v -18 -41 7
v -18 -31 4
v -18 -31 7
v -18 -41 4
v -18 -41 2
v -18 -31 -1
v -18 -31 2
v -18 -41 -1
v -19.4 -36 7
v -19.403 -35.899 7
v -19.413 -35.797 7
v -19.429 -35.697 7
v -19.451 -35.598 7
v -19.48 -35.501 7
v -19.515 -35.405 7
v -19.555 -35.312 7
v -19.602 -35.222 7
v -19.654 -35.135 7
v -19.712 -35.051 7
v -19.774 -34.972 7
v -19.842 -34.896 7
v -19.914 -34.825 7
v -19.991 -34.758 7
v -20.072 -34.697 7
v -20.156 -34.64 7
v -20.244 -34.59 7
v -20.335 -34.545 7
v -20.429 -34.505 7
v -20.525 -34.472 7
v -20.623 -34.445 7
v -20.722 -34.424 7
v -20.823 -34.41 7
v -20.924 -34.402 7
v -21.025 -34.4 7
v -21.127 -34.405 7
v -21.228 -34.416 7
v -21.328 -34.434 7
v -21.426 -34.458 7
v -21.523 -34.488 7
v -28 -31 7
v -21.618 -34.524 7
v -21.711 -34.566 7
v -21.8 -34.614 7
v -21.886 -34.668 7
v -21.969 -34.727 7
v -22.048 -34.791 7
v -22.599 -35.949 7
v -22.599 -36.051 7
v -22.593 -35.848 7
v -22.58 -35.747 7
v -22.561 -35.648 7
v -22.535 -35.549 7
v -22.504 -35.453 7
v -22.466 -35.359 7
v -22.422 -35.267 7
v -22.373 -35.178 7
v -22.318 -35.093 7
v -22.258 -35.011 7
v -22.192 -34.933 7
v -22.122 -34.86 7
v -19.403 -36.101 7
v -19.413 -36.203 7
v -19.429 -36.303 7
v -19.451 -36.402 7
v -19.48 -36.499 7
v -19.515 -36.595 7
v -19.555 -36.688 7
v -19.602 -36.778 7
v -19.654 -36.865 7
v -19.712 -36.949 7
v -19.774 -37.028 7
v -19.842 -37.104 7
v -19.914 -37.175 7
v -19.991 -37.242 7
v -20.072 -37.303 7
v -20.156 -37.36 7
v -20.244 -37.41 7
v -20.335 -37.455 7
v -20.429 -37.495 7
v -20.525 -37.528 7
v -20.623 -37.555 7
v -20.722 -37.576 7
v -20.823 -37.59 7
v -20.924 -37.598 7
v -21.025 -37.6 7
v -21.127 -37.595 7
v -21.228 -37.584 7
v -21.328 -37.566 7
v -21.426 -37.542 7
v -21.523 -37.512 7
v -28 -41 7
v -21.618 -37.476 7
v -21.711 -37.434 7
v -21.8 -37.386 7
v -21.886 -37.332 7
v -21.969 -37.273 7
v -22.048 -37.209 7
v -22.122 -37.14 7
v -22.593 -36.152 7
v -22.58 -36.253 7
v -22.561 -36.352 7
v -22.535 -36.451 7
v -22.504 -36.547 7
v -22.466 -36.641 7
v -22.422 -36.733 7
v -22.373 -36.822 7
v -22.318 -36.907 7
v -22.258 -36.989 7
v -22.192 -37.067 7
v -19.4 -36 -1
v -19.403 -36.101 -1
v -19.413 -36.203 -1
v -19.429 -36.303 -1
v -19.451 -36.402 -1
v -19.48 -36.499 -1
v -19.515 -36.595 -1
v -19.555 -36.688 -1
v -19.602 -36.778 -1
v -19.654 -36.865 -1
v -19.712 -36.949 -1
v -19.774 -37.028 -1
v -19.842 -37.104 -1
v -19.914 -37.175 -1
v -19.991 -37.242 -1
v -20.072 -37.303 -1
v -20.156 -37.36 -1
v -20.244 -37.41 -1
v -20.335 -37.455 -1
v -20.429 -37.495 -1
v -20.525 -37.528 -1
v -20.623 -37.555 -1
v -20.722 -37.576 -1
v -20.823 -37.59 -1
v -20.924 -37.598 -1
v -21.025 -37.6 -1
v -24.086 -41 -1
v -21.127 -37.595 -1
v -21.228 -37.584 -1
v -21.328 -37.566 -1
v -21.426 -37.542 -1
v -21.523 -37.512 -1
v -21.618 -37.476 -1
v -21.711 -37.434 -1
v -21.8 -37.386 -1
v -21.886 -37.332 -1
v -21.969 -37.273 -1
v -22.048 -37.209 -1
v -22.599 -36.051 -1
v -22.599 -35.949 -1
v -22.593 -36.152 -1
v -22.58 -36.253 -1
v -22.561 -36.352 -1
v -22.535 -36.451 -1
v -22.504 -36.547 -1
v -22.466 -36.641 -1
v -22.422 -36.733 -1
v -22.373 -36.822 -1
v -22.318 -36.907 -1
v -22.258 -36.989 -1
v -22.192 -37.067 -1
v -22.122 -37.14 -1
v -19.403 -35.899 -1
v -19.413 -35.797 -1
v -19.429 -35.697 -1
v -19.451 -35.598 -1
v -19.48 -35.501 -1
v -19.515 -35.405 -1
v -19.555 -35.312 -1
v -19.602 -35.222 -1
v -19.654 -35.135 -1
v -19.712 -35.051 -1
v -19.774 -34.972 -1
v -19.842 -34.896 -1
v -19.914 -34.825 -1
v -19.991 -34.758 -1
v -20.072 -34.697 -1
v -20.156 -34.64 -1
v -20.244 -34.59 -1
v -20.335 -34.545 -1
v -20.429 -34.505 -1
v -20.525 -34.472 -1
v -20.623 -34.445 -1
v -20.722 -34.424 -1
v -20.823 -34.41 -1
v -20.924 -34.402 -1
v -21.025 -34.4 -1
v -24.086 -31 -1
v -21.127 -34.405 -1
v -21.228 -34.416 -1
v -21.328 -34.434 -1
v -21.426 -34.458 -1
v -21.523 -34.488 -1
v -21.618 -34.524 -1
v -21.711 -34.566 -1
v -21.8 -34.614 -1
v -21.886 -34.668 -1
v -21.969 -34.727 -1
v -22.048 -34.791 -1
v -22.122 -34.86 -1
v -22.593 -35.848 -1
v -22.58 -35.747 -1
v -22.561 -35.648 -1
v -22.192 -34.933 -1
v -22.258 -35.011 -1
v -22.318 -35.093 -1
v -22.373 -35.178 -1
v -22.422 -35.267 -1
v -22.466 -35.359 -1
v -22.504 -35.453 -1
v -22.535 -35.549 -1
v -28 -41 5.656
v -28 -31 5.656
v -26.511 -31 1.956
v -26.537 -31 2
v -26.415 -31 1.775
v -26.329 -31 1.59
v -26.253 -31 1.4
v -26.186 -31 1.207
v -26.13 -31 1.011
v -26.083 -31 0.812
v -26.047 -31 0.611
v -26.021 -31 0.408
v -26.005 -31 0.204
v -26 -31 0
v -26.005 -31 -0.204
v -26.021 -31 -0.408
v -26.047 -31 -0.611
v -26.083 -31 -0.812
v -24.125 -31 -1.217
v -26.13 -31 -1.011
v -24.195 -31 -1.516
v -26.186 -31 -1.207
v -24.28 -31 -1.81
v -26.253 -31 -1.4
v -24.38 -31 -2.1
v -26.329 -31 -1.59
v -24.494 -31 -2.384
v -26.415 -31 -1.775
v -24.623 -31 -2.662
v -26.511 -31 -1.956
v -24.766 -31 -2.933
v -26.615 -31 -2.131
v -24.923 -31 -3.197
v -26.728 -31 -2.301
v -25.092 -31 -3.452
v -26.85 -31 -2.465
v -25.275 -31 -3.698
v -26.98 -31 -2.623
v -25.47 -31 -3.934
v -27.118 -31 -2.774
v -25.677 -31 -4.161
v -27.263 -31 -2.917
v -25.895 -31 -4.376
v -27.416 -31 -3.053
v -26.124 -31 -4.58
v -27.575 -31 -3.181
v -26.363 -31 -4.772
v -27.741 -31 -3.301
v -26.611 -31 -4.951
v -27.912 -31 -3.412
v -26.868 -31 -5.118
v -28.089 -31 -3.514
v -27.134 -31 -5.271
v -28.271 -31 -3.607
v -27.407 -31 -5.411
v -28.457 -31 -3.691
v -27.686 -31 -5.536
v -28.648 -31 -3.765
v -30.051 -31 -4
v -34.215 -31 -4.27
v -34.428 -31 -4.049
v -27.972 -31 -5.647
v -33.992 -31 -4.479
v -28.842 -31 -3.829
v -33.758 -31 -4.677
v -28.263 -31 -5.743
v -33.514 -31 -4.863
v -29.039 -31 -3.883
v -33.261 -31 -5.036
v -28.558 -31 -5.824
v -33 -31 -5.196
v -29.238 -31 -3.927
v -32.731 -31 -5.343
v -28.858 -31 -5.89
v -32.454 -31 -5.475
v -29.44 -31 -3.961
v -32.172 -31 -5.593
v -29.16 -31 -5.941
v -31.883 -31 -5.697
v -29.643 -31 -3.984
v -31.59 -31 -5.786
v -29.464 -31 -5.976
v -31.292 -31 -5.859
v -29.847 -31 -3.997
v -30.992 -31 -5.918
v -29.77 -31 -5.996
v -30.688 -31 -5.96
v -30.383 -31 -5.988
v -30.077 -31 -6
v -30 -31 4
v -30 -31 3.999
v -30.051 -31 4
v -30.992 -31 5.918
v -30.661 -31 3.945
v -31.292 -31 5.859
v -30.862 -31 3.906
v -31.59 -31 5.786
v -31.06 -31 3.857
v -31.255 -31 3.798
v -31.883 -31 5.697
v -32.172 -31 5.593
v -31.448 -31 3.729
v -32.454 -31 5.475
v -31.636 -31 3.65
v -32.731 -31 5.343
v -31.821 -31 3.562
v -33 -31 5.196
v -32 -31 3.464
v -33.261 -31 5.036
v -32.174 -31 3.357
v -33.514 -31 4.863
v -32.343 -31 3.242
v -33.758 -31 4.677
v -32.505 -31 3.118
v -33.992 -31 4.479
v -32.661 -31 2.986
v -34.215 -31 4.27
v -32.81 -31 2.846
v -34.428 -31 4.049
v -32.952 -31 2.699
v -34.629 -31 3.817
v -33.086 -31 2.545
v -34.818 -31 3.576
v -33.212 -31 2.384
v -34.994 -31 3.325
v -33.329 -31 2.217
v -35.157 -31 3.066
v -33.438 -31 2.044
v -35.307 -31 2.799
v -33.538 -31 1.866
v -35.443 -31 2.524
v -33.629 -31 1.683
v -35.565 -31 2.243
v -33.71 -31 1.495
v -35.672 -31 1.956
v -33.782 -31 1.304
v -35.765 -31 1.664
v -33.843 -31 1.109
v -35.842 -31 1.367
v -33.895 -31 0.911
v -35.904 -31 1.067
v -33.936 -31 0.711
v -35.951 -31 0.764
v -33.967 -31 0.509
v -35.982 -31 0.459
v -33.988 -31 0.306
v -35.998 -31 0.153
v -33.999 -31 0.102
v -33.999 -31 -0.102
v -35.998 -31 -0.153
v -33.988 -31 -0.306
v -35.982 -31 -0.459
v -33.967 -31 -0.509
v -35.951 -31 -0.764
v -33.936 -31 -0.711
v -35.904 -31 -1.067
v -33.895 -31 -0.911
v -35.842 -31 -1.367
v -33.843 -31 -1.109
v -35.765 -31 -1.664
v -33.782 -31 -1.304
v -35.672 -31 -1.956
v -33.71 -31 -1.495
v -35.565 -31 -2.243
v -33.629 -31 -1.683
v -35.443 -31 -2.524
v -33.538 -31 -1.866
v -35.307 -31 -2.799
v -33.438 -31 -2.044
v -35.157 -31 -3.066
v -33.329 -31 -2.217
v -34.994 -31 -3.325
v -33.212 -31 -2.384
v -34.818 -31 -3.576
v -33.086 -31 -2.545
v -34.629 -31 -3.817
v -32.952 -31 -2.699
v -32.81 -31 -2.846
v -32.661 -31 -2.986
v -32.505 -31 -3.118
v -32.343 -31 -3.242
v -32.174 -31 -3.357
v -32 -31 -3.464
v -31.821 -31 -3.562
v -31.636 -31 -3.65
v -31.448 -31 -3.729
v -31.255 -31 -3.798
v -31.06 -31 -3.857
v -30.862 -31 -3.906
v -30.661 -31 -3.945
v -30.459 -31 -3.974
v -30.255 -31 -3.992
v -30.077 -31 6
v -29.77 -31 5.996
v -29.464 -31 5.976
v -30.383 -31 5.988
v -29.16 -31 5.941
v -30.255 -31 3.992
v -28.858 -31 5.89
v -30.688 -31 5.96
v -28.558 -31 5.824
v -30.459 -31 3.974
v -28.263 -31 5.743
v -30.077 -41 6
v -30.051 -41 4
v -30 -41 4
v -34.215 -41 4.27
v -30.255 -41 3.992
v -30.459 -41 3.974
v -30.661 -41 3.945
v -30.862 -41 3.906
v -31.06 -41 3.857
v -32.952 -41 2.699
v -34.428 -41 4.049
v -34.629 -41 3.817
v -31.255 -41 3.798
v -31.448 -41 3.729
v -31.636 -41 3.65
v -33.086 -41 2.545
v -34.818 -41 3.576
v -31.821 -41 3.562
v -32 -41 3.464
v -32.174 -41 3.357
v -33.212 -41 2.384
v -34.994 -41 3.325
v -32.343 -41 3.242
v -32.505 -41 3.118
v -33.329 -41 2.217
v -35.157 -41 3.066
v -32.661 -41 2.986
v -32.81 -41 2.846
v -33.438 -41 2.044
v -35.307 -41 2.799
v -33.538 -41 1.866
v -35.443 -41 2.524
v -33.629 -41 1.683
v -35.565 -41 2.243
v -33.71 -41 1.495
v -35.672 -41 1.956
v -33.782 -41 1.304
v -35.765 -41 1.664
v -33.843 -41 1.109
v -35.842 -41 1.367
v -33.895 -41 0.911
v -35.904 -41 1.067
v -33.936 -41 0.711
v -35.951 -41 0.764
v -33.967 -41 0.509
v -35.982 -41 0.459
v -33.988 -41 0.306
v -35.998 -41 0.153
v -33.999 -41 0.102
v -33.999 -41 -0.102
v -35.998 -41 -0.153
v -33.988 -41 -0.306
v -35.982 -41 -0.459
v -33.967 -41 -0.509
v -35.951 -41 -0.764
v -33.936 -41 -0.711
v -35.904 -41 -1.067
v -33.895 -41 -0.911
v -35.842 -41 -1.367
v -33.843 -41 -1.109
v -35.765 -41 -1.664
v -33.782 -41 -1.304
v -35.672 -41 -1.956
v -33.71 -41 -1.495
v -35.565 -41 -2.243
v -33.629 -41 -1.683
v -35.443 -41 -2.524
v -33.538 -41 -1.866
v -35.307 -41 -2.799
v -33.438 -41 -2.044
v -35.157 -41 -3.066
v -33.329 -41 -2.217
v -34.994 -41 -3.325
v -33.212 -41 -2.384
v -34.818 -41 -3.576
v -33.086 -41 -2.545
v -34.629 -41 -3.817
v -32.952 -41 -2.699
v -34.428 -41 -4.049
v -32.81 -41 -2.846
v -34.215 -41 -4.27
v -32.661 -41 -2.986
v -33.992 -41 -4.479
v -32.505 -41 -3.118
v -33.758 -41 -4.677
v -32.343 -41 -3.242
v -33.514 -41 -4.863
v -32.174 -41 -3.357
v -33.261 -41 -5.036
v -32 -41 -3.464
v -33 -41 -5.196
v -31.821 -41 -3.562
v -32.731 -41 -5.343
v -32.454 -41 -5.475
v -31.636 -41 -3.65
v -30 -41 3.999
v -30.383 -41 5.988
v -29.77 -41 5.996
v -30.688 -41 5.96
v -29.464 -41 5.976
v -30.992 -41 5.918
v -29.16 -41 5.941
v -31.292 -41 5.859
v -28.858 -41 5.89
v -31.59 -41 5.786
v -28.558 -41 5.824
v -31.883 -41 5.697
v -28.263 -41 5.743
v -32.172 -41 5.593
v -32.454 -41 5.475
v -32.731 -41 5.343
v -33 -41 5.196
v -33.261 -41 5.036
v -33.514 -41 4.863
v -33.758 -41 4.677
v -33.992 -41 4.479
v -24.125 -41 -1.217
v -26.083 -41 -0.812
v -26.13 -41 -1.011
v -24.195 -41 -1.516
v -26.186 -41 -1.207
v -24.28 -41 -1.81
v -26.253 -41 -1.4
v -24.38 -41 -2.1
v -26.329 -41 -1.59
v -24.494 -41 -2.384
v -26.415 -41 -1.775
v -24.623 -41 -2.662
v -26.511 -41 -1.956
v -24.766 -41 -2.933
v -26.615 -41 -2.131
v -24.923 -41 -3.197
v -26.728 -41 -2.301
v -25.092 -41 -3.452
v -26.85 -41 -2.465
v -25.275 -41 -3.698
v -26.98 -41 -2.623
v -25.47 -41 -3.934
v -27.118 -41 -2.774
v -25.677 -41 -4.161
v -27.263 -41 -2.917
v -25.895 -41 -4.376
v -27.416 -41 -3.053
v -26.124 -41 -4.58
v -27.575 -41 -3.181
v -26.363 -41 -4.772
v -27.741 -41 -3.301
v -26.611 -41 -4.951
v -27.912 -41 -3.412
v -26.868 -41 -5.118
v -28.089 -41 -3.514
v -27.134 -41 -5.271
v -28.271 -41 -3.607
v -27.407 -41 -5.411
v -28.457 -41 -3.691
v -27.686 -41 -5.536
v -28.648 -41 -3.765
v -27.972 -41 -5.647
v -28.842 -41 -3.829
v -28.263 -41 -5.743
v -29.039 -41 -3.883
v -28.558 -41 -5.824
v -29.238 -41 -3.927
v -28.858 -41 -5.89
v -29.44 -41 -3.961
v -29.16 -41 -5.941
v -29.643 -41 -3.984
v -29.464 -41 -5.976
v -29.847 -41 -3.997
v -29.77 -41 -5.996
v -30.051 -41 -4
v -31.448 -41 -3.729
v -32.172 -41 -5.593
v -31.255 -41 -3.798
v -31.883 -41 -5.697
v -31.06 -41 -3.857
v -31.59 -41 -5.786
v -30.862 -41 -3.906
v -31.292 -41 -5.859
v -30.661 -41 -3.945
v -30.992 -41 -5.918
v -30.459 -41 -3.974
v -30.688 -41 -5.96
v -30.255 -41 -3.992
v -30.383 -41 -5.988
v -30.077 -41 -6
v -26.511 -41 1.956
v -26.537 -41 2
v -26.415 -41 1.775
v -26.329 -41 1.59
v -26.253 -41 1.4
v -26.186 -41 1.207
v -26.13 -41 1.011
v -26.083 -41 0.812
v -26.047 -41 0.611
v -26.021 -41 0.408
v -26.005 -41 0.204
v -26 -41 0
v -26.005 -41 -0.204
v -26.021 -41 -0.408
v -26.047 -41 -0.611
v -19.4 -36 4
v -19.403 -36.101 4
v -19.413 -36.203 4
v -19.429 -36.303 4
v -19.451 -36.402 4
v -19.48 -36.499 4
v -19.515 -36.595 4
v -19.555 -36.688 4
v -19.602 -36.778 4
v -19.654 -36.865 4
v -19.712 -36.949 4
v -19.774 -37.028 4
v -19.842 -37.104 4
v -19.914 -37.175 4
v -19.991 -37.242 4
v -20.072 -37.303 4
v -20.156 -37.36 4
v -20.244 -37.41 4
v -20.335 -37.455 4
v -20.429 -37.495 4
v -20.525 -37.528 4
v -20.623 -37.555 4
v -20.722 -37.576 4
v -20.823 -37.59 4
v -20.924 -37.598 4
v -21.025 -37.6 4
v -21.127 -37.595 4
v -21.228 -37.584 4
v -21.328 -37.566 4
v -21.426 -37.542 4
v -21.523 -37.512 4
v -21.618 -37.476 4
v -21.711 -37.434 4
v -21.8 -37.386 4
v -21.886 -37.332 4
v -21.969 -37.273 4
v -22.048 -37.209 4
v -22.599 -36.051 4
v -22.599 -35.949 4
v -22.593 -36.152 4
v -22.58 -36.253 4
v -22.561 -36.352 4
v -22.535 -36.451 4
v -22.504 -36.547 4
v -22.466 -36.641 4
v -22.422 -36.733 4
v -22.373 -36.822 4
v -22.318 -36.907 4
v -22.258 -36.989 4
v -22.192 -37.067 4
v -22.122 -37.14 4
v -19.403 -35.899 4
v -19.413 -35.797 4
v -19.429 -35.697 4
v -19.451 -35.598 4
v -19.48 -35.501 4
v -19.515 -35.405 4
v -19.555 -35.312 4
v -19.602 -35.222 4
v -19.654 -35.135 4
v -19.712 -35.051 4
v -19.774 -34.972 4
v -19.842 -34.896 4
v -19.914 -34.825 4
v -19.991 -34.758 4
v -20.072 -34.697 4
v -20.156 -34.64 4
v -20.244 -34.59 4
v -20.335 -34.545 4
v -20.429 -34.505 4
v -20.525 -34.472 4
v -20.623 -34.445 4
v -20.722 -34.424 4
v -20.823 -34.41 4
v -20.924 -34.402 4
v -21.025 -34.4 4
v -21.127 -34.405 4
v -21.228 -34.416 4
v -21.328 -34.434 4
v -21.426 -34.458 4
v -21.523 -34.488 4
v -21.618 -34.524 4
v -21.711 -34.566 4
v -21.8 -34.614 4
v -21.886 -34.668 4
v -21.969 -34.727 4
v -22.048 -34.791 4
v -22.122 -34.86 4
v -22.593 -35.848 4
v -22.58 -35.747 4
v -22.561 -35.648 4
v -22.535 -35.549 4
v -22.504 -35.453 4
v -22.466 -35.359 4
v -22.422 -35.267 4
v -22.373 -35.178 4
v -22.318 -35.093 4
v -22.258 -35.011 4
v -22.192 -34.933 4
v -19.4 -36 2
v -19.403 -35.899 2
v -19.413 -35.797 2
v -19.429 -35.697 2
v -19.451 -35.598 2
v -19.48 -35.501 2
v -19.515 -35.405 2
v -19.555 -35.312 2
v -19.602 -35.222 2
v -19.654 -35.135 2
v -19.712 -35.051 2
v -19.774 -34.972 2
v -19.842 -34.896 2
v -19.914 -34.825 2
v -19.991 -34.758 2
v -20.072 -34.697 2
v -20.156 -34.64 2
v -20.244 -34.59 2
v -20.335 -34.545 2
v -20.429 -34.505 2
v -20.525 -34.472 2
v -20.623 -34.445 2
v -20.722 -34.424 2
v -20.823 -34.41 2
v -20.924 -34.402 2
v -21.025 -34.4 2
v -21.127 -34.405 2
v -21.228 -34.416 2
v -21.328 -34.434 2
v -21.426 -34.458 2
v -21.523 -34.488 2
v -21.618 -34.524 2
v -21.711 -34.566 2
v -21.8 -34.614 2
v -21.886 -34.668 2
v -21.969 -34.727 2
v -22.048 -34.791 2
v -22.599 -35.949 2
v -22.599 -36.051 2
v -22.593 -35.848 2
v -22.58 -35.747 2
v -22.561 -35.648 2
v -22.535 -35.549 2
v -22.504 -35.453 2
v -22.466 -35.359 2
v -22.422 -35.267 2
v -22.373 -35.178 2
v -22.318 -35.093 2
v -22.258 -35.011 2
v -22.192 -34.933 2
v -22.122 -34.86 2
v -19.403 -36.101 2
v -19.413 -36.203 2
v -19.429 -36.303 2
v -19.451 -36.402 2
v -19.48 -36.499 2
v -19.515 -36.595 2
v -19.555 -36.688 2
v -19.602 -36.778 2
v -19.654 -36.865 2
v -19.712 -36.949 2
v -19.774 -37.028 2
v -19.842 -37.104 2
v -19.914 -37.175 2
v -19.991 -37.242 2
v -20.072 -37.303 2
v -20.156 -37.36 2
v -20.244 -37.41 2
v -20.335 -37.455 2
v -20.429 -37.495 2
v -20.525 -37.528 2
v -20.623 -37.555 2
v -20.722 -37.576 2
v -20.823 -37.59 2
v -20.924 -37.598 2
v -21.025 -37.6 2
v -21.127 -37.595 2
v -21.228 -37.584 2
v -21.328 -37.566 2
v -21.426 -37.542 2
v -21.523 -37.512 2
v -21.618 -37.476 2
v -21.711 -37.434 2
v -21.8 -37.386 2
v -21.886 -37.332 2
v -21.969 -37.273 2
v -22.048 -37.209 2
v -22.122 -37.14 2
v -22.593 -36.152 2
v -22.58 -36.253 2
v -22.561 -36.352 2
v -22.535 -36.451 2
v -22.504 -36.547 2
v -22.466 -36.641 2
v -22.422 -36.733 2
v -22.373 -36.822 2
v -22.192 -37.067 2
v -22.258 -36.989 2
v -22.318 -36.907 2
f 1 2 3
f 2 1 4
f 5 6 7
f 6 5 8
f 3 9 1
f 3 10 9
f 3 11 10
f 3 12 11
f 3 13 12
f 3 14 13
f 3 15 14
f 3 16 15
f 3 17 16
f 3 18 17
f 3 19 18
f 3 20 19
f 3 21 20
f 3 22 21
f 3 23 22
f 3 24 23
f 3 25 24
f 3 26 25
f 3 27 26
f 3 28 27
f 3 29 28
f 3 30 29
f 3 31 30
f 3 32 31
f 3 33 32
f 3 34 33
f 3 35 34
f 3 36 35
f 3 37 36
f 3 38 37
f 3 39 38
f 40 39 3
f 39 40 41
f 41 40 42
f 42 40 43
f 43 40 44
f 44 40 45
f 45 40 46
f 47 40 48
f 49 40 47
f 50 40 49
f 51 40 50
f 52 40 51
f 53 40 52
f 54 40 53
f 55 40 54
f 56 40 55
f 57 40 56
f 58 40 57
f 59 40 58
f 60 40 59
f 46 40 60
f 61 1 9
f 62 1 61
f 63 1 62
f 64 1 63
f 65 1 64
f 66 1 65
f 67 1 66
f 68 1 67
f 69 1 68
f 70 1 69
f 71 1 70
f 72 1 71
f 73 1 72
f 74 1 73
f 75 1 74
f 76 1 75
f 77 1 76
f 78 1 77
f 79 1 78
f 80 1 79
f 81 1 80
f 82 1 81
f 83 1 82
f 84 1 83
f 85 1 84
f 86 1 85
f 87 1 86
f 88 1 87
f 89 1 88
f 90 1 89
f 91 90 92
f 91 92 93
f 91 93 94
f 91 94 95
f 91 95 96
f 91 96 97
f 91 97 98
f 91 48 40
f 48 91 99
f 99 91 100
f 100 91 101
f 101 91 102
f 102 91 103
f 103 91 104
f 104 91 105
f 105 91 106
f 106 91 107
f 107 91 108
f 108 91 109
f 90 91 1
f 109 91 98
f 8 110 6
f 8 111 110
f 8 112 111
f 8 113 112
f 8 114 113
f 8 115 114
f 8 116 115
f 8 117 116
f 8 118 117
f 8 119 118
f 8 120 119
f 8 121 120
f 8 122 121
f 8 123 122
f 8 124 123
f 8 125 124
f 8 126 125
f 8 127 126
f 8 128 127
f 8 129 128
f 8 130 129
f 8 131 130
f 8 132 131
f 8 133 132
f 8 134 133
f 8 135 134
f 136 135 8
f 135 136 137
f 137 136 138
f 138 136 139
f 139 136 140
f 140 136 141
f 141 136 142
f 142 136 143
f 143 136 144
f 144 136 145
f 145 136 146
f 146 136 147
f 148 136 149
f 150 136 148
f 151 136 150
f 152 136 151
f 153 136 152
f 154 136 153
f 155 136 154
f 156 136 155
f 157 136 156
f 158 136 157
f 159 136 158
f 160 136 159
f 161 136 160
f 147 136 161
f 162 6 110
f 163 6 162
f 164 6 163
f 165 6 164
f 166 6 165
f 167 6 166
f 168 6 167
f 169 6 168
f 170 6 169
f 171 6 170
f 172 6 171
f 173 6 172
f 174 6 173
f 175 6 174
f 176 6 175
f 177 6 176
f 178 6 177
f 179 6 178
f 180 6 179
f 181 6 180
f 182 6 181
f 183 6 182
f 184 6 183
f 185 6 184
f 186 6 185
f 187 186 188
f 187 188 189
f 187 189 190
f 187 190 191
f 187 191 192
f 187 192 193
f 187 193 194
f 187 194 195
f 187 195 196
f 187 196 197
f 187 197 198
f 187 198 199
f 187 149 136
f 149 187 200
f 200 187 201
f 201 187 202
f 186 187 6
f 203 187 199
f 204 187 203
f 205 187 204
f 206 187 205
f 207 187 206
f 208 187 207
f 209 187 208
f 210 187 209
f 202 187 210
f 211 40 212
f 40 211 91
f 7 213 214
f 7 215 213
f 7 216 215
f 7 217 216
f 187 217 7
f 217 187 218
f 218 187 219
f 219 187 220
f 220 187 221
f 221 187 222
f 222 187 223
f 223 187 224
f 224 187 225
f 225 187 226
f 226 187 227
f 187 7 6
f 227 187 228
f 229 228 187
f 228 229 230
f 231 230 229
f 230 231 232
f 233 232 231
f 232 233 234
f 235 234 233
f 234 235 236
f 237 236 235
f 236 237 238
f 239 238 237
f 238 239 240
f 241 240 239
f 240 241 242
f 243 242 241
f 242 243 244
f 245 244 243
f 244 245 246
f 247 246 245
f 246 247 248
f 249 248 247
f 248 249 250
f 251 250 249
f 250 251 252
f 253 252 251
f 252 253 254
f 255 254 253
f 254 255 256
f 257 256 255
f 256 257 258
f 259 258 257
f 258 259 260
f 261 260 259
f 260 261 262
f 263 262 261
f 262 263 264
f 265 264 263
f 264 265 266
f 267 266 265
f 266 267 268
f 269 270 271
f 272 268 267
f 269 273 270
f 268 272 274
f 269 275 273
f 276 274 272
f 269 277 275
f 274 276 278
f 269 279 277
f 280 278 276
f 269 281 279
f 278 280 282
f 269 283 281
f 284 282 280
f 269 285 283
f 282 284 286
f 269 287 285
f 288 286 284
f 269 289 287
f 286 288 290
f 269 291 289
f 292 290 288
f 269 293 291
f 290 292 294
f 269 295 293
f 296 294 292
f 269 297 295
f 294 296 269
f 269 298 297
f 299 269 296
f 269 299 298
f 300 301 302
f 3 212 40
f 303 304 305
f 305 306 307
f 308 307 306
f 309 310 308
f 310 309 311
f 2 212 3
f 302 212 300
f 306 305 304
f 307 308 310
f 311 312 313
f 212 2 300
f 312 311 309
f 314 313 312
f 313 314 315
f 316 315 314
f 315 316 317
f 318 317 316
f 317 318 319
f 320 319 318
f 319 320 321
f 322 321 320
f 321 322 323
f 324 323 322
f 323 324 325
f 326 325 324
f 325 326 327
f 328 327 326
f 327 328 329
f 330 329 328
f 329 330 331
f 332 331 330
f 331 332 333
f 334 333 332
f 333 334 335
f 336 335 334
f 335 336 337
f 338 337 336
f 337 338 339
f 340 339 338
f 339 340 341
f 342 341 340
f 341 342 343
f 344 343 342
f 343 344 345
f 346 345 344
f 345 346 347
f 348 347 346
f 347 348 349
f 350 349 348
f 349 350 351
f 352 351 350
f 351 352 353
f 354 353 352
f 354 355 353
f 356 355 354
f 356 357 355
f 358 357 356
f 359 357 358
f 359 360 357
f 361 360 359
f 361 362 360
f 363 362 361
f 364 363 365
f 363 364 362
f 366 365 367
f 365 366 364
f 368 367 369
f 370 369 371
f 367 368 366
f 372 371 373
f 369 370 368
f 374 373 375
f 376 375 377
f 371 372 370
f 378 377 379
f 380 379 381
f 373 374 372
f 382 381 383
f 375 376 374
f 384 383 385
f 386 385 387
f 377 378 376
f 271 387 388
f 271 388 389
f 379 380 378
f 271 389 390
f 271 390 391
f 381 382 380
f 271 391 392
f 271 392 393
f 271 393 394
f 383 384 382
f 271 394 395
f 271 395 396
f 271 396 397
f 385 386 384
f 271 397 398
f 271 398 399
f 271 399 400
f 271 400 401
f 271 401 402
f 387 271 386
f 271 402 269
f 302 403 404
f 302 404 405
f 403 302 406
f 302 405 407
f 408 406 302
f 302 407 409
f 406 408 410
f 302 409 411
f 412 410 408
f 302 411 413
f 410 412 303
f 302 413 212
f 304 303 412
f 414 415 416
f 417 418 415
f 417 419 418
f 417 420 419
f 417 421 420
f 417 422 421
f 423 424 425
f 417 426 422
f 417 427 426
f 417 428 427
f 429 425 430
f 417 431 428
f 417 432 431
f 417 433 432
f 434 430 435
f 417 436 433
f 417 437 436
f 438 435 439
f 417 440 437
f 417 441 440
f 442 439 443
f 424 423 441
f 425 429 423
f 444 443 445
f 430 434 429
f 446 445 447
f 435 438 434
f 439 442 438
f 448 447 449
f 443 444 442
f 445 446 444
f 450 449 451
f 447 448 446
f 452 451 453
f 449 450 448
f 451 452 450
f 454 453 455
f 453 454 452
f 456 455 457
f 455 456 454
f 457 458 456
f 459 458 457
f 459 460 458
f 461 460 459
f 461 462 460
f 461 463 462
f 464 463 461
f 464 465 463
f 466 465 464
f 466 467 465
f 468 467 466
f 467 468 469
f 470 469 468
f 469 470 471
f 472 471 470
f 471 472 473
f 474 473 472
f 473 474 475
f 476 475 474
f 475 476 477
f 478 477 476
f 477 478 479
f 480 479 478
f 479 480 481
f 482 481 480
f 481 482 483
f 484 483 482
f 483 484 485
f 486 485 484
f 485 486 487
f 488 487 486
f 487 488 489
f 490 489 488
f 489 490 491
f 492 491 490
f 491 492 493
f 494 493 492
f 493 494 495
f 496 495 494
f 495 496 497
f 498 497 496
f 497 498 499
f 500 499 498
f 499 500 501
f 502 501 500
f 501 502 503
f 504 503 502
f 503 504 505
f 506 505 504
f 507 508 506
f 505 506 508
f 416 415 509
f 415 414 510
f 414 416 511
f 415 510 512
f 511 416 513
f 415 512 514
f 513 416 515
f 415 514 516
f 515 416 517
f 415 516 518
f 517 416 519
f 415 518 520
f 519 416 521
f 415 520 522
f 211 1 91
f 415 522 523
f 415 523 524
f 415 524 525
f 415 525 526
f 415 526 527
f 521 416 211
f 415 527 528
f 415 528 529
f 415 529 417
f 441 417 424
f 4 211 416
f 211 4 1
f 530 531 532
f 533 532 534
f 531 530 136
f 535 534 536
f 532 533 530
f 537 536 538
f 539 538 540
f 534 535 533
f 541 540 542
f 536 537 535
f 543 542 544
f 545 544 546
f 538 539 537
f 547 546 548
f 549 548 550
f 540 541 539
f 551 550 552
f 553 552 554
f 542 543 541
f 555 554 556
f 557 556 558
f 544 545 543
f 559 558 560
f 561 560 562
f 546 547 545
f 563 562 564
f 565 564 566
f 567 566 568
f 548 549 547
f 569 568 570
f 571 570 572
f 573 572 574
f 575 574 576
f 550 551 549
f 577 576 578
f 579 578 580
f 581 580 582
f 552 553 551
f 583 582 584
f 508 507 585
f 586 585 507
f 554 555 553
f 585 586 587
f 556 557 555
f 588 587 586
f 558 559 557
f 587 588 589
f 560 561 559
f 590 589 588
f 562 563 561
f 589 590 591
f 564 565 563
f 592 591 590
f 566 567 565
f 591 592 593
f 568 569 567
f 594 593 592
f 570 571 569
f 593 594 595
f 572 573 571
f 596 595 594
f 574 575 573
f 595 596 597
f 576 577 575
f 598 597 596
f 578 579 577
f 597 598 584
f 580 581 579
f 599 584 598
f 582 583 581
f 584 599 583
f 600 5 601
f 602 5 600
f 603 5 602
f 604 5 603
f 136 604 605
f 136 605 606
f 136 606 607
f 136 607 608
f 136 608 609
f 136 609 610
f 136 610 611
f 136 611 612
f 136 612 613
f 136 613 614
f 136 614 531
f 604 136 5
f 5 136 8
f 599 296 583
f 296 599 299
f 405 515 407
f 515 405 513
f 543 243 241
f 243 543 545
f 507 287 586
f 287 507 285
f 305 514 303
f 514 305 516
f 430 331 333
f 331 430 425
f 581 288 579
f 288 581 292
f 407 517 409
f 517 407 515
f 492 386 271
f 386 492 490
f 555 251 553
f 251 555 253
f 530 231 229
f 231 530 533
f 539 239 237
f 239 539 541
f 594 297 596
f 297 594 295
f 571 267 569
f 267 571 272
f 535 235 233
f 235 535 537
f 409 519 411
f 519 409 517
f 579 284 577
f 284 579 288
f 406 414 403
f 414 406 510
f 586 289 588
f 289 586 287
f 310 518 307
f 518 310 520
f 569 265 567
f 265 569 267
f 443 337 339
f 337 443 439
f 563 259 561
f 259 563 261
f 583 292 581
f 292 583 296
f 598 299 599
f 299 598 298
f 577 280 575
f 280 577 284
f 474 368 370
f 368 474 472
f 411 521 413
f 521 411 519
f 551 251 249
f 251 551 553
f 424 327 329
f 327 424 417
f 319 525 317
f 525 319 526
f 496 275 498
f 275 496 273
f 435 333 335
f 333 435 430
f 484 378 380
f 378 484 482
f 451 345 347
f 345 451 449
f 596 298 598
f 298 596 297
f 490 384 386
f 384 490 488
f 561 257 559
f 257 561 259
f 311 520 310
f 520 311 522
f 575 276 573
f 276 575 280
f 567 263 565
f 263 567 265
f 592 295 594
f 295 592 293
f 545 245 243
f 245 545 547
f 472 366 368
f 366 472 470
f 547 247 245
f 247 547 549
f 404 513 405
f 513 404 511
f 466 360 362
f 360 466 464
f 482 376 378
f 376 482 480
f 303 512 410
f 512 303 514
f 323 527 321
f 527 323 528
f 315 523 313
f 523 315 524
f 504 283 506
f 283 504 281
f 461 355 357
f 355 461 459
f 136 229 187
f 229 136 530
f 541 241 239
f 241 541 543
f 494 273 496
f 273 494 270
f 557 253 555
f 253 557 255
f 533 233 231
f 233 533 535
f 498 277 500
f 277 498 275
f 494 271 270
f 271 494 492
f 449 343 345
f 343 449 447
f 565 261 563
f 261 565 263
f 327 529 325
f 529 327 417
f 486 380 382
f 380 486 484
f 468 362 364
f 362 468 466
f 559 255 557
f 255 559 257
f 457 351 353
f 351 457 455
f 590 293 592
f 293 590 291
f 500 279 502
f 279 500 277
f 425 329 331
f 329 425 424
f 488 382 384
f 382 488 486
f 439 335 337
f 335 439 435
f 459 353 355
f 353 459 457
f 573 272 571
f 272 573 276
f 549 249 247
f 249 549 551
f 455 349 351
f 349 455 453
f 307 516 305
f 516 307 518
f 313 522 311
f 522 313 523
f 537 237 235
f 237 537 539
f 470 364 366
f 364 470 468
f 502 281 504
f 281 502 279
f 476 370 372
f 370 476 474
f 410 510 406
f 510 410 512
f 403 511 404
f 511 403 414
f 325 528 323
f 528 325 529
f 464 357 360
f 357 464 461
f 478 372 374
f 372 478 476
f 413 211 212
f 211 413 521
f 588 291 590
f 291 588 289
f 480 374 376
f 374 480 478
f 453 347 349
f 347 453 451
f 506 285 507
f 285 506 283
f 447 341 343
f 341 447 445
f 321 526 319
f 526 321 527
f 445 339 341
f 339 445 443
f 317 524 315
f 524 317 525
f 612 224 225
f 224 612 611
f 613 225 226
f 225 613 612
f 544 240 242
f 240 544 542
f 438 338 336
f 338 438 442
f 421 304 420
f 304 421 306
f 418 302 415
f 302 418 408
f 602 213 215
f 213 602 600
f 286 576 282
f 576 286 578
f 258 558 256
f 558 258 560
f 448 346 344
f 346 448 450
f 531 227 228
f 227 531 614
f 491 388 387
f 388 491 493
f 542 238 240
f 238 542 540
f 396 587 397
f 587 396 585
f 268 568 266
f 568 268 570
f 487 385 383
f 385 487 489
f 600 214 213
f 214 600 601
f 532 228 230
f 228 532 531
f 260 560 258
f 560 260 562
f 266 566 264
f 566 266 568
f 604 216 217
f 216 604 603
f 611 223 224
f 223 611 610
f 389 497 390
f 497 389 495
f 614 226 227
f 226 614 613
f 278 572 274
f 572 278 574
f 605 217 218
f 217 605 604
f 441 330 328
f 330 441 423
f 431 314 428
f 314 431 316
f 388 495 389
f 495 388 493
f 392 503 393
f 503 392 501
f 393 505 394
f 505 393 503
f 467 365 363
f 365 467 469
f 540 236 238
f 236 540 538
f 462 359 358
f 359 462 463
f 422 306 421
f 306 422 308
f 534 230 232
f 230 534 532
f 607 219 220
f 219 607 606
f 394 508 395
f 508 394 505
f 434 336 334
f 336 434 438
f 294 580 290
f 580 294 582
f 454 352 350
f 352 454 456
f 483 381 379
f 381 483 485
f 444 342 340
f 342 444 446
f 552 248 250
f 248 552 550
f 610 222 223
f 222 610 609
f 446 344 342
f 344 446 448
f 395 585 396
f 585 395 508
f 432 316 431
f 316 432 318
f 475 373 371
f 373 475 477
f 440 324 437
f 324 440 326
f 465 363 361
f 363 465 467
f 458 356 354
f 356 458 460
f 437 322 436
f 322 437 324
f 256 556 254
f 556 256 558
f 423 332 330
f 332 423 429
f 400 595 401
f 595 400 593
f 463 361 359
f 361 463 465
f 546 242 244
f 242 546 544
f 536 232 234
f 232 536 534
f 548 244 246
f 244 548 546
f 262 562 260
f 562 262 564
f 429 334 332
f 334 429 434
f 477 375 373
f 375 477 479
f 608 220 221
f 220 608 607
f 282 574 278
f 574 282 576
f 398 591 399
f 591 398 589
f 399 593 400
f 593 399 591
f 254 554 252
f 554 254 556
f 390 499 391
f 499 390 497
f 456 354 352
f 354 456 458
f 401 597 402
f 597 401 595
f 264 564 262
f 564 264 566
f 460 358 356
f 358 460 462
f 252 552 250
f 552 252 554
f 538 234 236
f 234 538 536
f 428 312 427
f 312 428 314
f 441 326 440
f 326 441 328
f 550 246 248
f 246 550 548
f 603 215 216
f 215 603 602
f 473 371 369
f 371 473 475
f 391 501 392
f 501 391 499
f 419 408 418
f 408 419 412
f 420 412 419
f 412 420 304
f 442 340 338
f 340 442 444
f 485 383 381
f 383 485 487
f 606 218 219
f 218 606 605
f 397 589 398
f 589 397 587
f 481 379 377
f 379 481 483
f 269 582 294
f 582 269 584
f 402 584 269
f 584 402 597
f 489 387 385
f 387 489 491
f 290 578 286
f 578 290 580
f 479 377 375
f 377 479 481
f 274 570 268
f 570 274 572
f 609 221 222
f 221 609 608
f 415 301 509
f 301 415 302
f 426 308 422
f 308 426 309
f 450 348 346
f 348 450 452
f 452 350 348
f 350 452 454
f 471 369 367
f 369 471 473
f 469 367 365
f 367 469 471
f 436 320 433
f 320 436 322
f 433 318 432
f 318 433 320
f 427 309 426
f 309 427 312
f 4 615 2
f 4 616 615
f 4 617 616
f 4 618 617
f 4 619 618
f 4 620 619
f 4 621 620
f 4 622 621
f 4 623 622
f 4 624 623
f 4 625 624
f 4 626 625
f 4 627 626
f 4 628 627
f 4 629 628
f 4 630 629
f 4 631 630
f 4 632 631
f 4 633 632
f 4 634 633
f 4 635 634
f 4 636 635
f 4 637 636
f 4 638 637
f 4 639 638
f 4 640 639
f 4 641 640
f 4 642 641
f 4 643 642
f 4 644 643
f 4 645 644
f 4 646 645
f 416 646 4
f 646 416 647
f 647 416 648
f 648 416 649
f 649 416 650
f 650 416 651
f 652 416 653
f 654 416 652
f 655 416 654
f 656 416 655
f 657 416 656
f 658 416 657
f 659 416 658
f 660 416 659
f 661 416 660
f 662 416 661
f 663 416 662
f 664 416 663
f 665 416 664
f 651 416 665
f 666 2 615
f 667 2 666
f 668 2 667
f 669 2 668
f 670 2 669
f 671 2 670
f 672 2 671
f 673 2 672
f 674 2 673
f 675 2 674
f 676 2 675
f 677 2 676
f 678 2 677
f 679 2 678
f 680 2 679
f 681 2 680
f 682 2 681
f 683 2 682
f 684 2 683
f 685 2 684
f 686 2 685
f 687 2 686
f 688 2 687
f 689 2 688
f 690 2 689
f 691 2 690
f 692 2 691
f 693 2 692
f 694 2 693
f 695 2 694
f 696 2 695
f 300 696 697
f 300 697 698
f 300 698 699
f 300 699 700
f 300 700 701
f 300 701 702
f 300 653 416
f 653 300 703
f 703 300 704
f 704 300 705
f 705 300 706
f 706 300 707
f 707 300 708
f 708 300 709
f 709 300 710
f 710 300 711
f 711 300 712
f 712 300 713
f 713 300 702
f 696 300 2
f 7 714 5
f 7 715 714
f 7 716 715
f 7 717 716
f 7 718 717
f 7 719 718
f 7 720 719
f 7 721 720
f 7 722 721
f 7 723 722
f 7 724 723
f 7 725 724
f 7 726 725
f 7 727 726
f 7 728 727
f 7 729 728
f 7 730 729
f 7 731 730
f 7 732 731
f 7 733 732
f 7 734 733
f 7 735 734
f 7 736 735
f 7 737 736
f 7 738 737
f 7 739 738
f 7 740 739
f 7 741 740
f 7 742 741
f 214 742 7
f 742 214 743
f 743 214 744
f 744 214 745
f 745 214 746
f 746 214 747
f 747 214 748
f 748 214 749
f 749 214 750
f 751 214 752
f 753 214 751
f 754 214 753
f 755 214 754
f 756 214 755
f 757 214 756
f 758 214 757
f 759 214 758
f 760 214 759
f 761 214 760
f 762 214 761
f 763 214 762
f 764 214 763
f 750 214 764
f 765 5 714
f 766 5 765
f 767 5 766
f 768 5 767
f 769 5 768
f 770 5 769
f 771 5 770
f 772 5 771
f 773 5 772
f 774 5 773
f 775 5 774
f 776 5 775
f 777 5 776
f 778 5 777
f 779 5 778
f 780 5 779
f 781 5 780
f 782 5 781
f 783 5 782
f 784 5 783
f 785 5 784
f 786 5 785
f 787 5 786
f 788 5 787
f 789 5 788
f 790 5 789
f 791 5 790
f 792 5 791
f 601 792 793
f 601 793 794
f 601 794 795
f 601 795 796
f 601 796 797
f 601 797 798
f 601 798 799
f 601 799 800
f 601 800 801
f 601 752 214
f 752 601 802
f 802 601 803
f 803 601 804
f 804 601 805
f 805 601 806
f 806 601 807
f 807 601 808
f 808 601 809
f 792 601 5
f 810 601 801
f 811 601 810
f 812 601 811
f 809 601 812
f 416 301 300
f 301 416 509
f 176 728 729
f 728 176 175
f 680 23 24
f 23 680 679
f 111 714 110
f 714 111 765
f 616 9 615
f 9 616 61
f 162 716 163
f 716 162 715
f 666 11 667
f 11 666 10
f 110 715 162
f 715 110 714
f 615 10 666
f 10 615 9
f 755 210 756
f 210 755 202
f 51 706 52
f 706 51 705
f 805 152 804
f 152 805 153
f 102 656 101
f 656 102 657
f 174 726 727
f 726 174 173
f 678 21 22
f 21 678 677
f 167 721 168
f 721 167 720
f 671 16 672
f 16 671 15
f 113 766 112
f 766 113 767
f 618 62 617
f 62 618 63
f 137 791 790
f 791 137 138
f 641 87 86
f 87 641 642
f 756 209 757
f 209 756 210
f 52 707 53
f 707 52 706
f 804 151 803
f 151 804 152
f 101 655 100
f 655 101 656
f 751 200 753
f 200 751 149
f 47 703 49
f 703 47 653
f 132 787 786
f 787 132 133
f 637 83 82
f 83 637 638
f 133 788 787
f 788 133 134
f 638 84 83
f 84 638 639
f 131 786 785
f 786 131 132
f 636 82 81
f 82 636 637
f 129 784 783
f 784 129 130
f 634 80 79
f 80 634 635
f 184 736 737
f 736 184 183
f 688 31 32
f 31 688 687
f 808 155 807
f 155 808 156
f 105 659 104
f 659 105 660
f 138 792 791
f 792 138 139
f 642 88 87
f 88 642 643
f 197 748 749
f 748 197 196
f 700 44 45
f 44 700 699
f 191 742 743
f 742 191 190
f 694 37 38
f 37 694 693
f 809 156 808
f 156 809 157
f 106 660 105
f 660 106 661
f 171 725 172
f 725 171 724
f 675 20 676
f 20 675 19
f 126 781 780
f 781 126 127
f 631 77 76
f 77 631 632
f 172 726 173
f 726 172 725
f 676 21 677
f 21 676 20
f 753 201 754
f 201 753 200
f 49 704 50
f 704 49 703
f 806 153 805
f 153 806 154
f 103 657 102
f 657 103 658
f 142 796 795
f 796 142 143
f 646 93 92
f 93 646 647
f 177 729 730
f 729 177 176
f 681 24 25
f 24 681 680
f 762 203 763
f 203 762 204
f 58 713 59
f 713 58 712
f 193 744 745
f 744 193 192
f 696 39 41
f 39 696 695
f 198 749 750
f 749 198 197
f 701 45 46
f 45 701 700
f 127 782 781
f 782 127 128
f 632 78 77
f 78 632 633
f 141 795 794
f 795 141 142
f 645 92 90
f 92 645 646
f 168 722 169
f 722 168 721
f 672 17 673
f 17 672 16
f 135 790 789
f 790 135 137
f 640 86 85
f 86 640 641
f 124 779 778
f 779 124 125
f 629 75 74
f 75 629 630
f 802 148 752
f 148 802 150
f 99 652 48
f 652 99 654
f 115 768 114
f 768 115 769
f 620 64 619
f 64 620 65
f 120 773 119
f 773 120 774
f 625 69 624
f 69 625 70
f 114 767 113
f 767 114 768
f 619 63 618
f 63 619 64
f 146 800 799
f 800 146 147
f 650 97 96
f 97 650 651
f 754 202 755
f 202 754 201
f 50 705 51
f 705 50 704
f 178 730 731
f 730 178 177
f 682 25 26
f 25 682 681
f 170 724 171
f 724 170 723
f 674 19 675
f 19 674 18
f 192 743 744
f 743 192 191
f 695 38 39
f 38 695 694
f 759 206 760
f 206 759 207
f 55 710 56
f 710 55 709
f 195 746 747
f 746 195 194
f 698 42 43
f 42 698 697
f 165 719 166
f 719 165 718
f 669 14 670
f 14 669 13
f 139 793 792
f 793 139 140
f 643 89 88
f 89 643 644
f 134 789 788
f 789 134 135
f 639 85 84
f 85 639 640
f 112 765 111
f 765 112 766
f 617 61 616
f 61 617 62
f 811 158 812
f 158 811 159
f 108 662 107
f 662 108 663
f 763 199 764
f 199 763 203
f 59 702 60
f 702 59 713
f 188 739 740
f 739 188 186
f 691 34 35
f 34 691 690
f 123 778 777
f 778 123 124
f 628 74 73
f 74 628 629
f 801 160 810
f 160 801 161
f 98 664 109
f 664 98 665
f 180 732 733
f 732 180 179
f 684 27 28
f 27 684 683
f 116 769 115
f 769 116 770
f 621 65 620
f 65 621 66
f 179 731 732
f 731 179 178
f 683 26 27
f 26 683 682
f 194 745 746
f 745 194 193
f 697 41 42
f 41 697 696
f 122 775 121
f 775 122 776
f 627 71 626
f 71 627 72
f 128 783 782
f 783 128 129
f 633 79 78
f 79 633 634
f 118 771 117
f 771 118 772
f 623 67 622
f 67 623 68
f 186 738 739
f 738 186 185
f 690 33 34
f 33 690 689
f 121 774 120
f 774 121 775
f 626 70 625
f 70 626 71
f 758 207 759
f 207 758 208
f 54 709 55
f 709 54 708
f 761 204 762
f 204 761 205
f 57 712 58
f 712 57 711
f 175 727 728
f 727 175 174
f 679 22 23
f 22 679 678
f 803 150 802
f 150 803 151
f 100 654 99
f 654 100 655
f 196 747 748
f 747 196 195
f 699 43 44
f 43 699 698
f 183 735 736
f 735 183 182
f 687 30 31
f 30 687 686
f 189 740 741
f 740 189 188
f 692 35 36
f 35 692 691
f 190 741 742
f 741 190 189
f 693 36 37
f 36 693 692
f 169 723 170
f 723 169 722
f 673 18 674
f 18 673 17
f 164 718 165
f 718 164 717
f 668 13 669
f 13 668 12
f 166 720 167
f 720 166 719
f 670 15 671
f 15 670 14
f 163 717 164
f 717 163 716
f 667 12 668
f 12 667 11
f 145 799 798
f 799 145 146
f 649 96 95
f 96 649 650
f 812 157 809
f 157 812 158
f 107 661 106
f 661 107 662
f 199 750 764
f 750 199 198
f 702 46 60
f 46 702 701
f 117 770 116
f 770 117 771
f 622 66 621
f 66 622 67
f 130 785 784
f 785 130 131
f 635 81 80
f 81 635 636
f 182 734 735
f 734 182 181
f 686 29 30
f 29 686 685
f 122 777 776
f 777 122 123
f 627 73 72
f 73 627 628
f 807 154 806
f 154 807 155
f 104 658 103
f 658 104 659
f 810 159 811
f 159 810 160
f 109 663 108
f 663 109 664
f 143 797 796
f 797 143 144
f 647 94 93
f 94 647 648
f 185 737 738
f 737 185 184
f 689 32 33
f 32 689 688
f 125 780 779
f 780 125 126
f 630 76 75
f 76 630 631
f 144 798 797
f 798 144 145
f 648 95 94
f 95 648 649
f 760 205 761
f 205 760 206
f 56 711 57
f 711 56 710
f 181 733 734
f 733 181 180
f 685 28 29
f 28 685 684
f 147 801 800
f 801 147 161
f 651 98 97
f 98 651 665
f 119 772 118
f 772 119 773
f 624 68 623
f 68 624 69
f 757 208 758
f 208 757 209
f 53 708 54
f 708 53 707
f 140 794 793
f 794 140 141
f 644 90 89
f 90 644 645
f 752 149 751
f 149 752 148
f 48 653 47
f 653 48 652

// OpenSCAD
// file: ../Parts/switch3.scad
//=================================================================================
// switch3.scad
// Model for metal toggle switches on globes and bike
//
// Dr Tom Flint, 26 Dec 2021
//=================================================================================

//-------------------------------------------------------
module switch3(pos=1,nut=0,washer=0){

  // stack
  cylinder(r=6.15/2,h=8.8,$fn=88);
  translate([0,0,8.8])
  rotate([10*pos,0,0])
  cylinder(r1=2.4/2,r2=3.1/2,h=10.2,$fn=88);

  // body
  translate([0,0,-9.5/2])
  cube([7,12.75,9.5],center=true);

  // wiring tabs
  color("red")
  translate([0,0,-13]){
    translate([0,0,4/2])
    cube([2.2,0.75,4],center=true);
    translate([0,4.3,4/2])
    cube([2.2,0.75,4],center=true);
    translate([0,-4.3,4/2])
    cube([2.2,0.75,4],center=true);
    
  }

  if(nut>0){
    translate([0,0,nut])
    cylinder(r=9.2/2,h=1.6,$fn=6);
  }
  if(washer>0){
    translate([0,0,washer]){
      cylinder(r=11.9/2,h=0.7,$fn=67);
      translate([0,5.8,-.1])
      cube([2.15,1.3,1.8],center=true);
    }
  }

}

//==================================================================================


switch3(pos=-1,nut=2,washer=1);


//==================================================================================
// file: ../Parts/rounder.scad
// rounder.scad
// cutting tool for rounding off corners with a cylinder

//---------------------
module rounder(
r=10,   // radius
h=10,   // height
f=22,    // $fn
extra=0.01  // extra size for the cube
){

difference(){
  translate([-extra,-extra,-extra])
  cube([r+extra,r+extra,h+2*extra]);
  translate([r,r,-1])
  cylinder(r=r,h=h+2,$fn=f);
}

}

//========================

rounder();

//========================
// main file
//=================================================================================
// bikeSwitches.scad
//
// switch plate for the ArtBike
//
// Dr Tom Flint, 26 Dec 2021
//=================================================================================


use <../Parts/rounder.scad>
use <../Parts/switch3.scad>


//---------------------------------------------------------------------------------
module plate(switches=0){
  
  difference(){
    union(){
      translate([-35,-80+16,15])
      cube([40,80,3]);

      translate([-10,-80+16,11.1-5])
      cube([15,80-16,3.9+5]);

      //color("red")
      translate([-20,-80+19,11.1])
      cube([20,6,10],center=true);

      //color("green")
      translate([-20,13,11.1])
      cube([20,6,10],center=true);

      //color("blue")
      translate([-32,-24,11.1])
      cube([6,76,10],center=true);

      // rounders
      translate([-35+6,16-6,6])
      rotate([0,0,-90])
      rounder(r=10,h=12,f=89);
      translate([-35+6,16-80+6,6])
      rotate([0,0,0])
      rounder(r=10,h=12,f=89);
    }
    // cut for loops
    loops(tol=0.2,cut=1);
    
    // cuts for switches left to right
    translate([-20,-4,14.8])
    rotate([0,0,90])
    cylinder(r=6.3/2,h=10,center=true,$fn=33);
  
    translate([-20,-4-22,14.8])
    rotate([0,0,90])
    cylinder(r=6.3/2,h=10,center=true,$fn=33);
  
    translate([-20,-4-44,14.8])
    rotate([0,0,90])
    cylinder(r=6.3/2,h=10,center=true,$fn=33);
    
    // cuts for washers
    translate([-20,-4,17.4]){
      rotate([0,0,90])
      translate([0,5.8,-.1])
      cube([2.5,2,2.5],center=true);
    }
    translate([-20,-4-22,17.4]){
      rotate([0,0,90])
      translate([0,5.8,-.1])
      cube([2.5,2,2.5],center=true);
    }
  
    translate([-20,-4-44,17.4]){
      rotate([0,0,90])
      translate([0,5.8,-.1])
      cube([2.5,2,2.5],center=true);
    }
  
  
    // cut for handlebars
    translate([0,-45-47,-50*sin(10)])
    rotate([-80,0,0])
    cylinder(r=22.8/2,h=50,$fn=89);

    translate([0,-45,0])
    rotate([-90,0,0])
    cylinder(r=22.8/2,h=45,$fn=89);
    
    // rounders
    translate([-35,16,0])
    rotate([0,0,-90])
    rounder(r=15,h=30,f=189);
    translate([-35,16-80,0])
    rotate([0,0,0])
    rounder(r=15,h=30,f=189);

    translate([5,16-80,0])
    rotate([0,0,90])
    rounder(r=15,h=30,f=189);
    translate([5,16,0])
    rotate([0,0,180])
    rounder(r=15,h=30,f=189);
    
    color("red")
    translate([-7,-26,18-0.3])
    rotate([0,0,-90])
    linear_extrude(height=1,scale=1)
    text("HEDWIG", font = "Open Sans:style=Bold", size=9,halign="center",valign="center",spacing=1.1);

  }
  
  if(switches>0){
//    color("cyan")
    translate([-20,-4,14.8])
    rotate([0,0,90])
    switch3(pos=0,nut=4.5,washer=3.5);
//    color("cyan")
    translate([-20,-4-22,14.8])
    rotate([0,0,90])
    switch3(pos=0,nut=4.5,washer=3.5);
//    color("cyan")
    translate([-20,-4-44,14.8])
    rotate([0,0,90])
    switch3(pos=0,nut=4.5,washer=3.5);
  }

}
//---------------------------------------------------------------------------------
module loops(tol=0,cut=0){

  difference(){
    union(){
      translate([0,-16,0])
      rotate([-90,0,0])
      cylinder(r=30/2+tol/2,h=10+tol,center=true,$fn=99);
  
      translate([-11,-16,8])
      cube([8+tol,10+tol,18+tol],center=true);
      
      translate([-13,-16,20-8])
      cube([24+tol,10+tol,10],center=true);

      translate([0,-16-20,0])
      rotate([-90,0,0])
      cylinder(r=30/2+tol/2,h=10+tol,center=true,$fn=99);

      translate([-11,-16-20,8])
      cube([8+tol,10+tol,18+tol],center=true);

      translate([-13,-16-20,20-8])
      cube([24+tol,10+tol,10],center=true);
      
      // rounders
      color("red")
      translate([-15,-11,7])
      rotate([0,0,180])
      rotate([-90,0,0])
      rounder(r=4,h=10,f=89);
      translate([-15,-11-20,7])
      rotate([0,0,180])
      rotate([-90,0,0])
      rounder(r=4,h=10,f=89);


      if(cut==1){
        // bolt positions for M3x?? 
        translate([-21,-16,10])
        cylinder(r=3.2/2,h=20,center=true,$fn=99);
        translate([-21,-16-20,10])
        cylinder(r=3.2/2,h=20,center=true,$fn=99);
      }
    }
    
     // cuts for handlebars 
    translate([0,-45-47,-50*sin(10)])
    rotate([-80,0,0])
    cylinder(r=22.5/2,h=50,$fn=89);

    translate([0,-45,0])
    rotate([-90,0,0])
    cylinder(r=22.5/2,h=45,$fn=89);
    
    if(cut==0){
      // bolt positions for M3x?? 
      translate([-21,-16,10])
      cylinder(r=3.2/2,h=20,center=true,$fn=99);
      translate([-21,-16-20,10])
      cylinder(r=3.2/2,h=20,center=true,$fn=99);

      // cut to allow install and tighten
      translate([-20,-16,10.5])
      cube([40,12,2],center=true);
      translate([-20,-16-20,10.5])
      cube([40,12,2],center=true);
    
    }
    
  }
}

//---------------------------------------------------------------------------------
module handleBars(){

$fn=89;

color("lightgray"){

translate([0,-45-47,-50*sin(10)])
rotate([-80,0,0])
cylinder(r=22.5/2,h=50);

translate([0,-45,0])
rotate([-90,0,0])
cylinder(r=22.2/2,h=45);

rotate([-90,0,0])
cylinder(r=30/2,h=16);

translate([0,16,0])
rotate([-90,0,0])
cylinder(r1=44.5/2,r2=51.8/2,h=6);

translate([0,16+6,0])
rotate([-90,0,0])
cylinder(r=51.8/2,h=20);

rotate([0,40,0])
translate([0,0,-28/2])
cube([100,16,28]);

}

}
//---------------------------------------------------------------------------------
module cableGland(){
  
$fn=123;

difference(){
  union(){
    translate([-28,-41,-1])
    cube([10,10,8]);

    translate([-30,-41,0])
    rotate([-90,0,0])
    cylinder(r=6,h=10);

  }
  translate([-30,-41,0])
  rotate([-90,0,0])
  cylinder(r=4,h=10);

  translate([-30,-41,2])
  cube([13,10,2]);

  translate([-21,-16-20,10])
  cylinder(r=3.2/2,h=40,center=true,$fn=99);

  }
}

//==================================================================================

//plate(switches=0);

//handleBars();

//color("cyan",alpha=0.5)
//difference(){
//loops(tol=0);
//cube([80,60,80],center=true);
//}

color("cyan")
cableGland();

//==================================================================================
